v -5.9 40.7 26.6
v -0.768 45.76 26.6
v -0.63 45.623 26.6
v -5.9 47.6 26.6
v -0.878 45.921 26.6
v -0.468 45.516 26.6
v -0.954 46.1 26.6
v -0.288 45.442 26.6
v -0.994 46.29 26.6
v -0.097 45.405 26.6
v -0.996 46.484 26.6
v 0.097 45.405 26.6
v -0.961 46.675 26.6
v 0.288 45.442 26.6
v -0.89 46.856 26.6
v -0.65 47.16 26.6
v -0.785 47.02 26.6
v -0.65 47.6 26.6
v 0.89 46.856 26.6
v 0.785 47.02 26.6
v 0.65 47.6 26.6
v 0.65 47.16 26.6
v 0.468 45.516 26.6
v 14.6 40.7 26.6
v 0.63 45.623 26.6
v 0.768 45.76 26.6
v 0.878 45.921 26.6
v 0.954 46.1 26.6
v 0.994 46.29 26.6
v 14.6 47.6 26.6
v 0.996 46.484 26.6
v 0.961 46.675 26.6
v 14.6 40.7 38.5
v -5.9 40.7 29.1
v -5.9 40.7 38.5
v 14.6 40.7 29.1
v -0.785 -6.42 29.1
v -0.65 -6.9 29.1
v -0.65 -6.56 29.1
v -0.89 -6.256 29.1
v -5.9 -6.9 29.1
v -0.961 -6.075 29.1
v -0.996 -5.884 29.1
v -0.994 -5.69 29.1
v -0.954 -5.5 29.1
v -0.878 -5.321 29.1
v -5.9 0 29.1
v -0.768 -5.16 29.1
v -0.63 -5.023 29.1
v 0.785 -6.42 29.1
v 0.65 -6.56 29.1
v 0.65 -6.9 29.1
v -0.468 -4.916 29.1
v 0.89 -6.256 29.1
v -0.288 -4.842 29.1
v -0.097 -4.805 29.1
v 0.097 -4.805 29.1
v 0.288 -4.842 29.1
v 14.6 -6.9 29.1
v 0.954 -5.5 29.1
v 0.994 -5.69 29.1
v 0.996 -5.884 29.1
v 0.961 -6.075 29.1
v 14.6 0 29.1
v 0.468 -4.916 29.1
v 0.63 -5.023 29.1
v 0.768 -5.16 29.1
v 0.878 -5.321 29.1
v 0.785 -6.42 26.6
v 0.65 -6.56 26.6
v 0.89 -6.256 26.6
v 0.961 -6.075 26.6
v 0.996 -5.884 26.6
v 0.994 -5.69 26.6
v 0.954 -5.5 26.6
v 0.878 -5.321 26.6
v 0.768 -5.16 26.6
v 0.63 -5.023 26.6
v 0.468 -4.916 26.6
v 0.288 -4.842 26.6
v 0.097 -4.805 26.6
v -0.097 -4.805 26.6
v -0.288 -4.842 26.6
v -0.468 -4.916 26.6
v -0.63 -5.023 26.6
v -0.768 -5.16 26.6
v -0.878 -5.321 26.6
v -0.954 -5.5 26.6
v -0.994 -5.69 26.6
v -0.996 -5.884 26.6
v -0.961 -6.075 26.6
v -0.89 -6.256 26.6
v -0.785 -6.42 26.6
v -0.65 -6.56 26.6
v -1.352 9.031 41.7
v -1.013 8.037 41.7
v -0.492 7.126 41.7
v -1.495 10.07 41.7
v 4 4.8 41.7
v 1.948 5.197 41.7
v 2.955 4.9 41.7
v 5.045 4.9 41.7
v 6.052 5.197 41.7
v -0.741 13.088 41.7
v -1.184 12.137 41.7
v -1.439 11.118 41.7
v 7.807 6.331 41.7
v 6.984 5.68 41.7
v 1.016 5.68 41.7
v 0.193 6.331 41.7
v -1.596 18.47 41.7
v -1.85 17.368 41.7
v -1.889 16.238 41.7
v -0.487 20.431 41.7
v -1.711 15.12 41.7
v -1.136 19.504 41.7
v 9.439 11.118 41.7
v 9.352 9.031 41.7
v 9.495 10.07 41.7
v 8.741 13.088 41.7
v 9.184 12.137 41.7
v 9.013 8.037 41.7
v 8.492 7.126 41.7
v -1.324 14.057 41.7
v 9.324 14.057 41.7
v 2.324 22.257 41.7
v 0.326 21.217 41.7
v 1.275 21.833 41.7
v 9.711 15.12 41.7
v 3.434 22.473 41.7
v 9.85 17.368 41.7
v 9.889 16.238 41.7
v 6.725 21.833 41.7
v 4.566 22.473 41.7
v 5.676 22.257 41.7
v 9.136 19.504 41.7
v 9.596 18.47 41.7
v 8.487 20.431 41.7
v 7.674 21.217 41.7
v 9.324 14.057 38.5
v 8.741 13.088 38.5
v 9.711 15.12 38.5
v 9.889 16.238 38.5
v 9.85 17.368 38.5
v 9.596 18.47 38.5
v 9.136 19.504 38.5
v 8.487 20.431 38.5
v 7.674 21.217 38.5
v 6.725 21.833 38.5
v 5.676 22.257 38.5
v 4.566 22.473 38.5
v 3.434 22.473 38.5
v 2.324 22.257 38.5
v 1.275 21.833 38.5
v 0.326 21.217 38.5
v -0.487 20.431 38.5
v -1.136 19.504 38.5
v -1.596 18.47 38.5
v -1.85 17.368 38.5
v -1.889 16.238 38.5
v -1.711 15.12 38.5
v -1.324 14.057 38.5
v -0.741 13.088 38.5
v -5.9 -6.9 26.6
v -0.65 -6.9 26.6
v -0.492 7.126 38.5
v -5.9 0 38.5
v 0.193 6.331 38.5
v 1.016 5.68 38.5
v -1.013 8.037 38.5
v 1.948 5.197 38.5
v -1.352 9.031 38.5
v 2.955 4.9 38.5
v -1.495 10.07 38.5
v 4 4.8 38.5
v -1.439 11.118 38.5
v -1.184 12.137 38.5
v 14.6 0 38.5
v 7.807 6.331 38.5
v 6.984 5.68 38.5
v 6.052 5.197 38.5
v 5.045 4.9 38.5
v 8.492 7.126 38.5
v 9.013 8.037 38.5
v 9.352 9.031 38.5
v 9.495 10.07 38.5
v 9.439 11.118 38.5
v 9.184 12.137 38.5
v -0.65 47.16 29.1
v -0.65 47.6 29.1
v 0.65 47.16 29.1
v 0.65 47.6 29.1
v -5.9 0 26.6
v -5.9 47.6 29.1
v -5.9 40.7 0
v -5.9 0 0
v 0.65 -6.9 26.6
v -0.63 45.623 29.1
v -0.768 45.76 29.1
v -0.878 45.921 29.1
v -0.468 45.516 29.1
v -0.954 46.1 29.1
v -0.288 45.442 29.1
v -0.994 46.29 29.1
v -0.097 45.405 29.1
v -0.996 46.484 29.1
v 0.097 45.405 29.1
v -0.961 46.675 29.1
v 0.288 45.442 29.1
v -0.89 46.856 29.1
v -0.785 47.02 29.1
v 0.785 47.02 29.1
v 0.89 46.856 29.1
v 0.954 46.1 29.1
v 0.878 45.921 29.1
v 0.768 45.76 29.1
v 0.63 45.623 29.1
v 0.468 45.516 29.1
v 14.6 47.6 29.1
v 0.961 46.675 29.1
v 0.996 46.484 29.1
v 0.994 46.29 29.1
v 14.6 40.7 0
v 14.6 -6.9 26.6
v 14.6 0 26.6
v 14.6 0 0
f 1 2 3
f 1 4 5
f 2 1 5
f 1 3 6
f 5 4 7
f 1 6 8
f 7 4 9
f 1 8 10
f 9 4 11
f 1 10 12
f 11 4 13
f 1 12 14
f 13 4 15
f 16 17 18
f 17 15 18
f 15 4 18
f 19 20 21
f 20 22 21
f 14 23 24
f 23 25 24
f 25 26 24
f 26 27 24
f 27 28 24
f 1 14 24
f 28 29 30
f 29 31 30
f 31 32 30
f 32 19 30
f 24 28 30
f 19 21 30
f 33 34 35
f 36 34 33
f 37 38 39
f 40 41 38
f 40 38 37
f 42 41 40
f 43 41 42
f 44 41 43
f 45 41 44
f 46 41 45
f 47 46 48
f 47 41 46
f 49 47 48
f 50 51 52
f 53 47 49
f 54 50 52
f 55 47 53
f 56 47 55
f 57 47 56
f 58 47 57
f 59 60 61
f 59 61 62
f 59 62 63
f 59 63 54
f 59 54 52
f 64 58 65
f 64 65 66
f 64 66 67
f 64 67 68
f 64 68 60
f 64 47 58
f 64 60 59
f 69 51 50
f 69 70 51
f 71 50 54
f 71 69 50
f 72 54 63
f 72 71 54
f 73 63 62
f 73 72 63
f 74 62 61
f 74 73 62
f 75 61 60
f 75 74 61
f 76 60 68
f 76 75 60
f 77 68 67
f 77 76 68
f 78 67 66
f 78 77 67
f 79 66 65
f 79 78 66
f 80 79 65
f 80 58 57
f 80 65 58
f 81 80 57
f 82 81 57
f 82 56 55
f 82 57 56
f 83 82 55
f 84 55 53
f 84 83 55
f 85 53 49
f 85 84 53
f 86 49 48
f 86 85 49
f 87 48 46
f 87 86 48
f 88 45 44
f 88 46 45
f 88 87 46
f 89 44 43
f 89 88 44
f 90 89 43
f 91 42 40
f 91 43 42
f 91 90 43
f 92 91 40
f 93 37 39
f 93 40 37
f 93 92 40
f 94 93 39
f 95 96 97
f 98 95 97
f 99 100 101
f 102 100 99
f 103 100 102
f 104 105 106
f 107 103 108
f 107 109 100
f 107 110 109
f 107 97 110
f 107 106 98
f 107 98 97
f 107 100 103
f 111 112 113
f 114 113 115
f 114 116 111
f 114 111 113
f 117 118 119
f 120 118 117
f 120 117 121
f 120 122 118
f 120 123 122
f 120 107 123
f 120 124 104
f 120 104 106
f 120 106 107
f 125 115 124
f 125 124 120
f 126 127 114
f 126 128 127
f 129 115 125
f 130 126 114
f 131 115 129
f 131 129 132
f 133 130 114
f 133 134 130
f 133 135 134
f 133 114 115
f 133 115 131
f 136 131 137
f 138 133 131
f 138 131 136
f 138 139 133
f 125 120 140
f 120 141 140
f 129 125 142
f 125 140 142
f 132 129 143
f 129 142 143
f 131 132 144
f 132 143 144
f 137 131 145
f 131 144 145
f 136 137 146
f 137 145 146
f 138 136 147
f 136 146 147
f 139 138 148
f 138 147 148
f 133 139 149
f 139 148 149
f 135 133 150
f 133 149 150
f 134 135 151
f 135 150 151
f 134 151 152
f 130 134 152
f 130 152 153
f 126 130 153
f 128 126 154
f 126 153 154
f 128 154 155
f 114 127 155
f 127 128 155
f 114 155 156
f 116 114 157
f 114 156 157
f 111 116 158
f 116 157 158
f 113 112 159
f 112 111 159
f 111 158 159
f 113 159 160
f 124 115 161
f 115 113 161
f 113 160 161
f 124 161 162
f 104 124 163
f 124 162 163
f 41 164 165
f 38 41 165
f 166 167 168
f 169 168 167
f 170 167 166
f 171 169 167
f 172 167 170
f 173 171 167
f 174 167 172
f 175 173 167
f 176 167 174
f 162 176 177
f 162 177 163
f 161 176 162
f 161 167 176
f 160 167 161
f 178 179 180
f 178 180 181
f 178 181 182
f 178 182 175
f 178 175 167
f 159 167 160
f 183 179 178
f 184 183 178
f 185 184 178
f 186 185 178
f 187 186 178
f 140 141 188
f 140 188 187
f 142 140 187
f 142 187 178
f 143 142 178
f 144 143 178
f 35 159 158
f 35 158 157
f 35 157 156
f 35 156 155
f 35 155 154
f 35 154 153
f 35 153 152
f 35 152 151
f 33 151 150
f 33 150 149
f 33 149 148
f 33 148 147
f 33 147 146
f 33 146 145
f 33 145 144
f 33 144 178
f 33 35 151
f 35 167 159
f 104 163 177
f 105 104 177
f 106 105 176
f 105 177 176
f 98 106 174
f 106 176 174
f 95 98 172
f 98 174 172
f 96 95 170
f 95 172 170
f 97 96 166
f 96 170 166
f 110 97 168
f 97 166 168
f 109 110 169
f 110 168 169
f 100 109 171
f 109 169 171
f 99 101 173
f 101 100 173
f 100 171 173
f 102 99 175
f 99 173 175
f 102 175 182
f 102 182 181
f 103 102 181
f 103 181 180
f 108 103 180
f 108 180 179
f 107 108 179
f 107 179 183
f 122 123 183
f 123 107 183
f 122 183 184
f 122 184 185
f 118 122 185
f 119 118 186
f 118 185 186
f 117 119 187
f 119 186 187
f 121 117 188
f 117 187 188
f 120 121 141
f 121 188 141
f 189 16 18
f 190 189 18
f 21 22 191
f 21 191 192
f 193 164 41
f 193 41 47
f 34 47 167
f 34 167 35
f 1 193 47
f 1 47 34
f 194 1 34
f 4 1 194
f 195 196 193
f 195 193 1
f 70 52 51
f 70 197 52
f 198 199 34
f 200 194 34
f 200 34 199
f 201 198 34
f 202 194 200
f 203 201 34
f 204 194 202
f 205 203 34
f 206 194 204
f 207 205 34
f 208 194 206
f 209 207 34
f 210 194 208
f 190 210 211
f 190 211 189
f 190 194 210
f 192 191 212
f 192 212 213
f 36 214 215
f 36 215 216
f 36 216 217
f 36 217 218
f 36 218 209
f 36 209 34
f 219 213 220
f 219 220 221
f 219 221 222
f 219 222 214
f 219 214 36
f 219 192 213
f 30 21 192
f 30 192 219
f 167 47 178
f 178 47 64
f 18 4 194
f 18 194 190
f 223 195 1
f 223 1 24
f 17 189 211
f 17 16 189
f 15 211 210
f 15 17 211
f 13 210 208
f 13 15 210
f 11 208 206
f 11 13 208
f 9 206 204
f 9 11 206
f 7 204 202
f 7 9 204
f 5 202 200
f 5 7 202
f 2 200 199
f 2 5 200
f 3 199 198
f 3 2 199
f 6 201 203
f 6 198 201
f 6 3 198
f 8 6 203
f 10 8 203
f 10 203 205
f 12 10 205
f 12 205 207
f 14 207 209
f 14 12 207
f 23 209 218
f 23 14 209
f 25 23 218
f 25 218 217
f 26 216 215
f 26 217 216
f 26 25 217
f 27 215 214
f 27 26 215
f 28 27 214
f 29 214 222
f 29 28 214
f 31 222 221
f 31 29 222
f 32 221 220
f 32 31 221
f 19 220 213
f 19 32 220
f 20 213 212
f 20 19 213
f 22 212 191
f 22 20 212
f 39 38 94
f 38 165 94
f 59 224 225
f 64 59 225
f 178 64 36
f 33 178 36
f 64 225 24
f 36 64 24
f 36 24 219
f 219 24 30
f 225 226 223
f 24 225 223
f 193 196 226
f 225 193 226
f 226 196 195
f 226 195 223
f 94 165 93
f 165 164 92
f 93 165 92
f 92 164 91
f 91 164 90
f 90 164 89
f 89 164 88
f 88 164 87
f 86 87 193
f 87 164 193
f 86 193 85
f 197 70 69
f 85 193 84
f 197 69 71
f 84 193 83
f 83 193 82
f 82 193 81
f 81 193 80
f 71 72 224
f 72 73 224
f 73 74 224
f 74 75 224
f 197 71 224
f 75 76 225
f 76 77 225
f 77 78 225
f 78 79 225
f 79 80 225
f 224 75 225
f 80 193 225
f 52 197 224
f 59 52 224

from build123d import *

# Parameters (mm, degrees)
BOX003_W          = 1.3
BOX003_H          = 3.3
BOX003_DEPTH      = 10
BOX002_W          = 1.3
BOX002_H          = 3.3
BOX002_DEPTH      = 10
CYLINDER004_R     = 1
CYLINDER004_DEPTH = 10
CYLINDER003_R     = 1
CYLINDER003_DEPTH = 10
CYLINDER001_R     = 5.5
CYLINDER001_DEPTH = 4
CYLINDER_R        = 5.9
CYLINDER_DEPTH    = 4
BOX001_W          = 20.5
BOX001_H          = 54.5
BOX001_DEPTH      = 2.5
BOX_W             = 20.5
BOX_H             = 40.7
BOX_DEPTH         = 38.5


with BuildPart() as cubo003:
    # Box003 → Box003 (new body)
    with BuildSketch(Plane(origin=(5.25, 46, 20), x_dir=(1, 0, 0), z_dir=(0, 0, 1))):
        with Locations((0.65, 1.65)):
            Rectangle(BOX003_W, BOX003_H)
    extrude(amount=BOX003_DEPTH)


with BuildPart() as rebajes:
    # Box002 → Box002 (new body)
    with BuildSketch(Plane(origin=(5.25, -9, 20), x_dir=(1, 0, 0), z_dir=(0, 0, 1))):
        with Locations((0.65, 1.65)):
            Rectangle(BOX002_W, BOX002_H)
    extrude(amount=BOX002_DEPTH)

    # Fusion005: union Cubo003
    add(cubo003.part)


with BuildPart() as taladro2:
    # Cylinder004 → Cylinder004 (new body)
    with BuildSketch(Plane(origin=(5.9, 46.4, 21), x_dir=(1, 0, 0), z_dir=(0, 0, 1))):
        Circle(CYLINDER004_R)
    extrude(amount=CYLINDER004_DEPTH)


with BuildPart() as taladros001:
    # Cylinder003 → Cylinder003 (new body)
    with BuildSketch(Plane(origin=(5.9, -5.8, 21), x_dir=(1, 0, 0), z_dir=(0, 0, 1))):
        Circle(CYLINDER003_R)
    extrude(amount=CYLINDER003_DEPTH)

    # Fusion004: union Taladro2
    add(taladro2.part)

    # Fusion006: union Rebajes
    add(rebajes.part)


with BuildPart() as cilindro001:
    # Cylinder001 → Cylinder001 (new body)
    with BuildSketch(Plane(origin=(9.9, 10.3, 37.7), x_dir=(1, 0, 0), z_dir=(0, 0, 1))):
        Circle(CYLINDER001_R)
    extrude(amount=CYLINDER001_DEPTH)


with BuildPart() as fusion001:
    # Cylinder → Cylinder (new body)
    with BuildSketch(Plane(origin=(9.9, 16.6, 37.7), x_dir=(1, 0, 0), z_dir=(0, 0, 1))):
        Circle(CYLINDER_R)
    extrude(amount=CYLINDER_DEPTH)

    # Fusion001: union Cilindro001
    add(cilindro001.part)


with BuildPart() as cubo001:
    # Box001 → Box001 (new body)
    with BuildSketch(Plane(origin=(0, -6.9, 26.6), x_dir=(1, 0, 0), z_dir=(0, 0, 1))):
        with Locations((10.25, 27.25)):
            Rectangle(BOX001_W, BOX001_H)
    extrude(amount=BOX001_DEPTH)


with BuildPart() as cuerpo_con_taladros:
    # Box → Box (new body)
    with BuildSketch(Plane.XY):
        with Locations((10.25, 20.35)):
            Rectangle(BOX_W, BOX_H)
    extrude(amount=BOX_DEPTH)

    # Fusion: union Cubo001
    add(cubo001.part)

    # Fusion003: union Fusion001
    add(fusion001.part)

    # Cut: cut Taladros001
    add(taladros001.part, mode=Mode.SUBTRACT)


with BuildPart() as cuerpo_con_taladros_1:
    # Cut placement: moved
    add(cuerpo_con_taladros.part.moved(Location((-5.9, 0, 0))))


solid = cuerpo_con_taladros_1.part
